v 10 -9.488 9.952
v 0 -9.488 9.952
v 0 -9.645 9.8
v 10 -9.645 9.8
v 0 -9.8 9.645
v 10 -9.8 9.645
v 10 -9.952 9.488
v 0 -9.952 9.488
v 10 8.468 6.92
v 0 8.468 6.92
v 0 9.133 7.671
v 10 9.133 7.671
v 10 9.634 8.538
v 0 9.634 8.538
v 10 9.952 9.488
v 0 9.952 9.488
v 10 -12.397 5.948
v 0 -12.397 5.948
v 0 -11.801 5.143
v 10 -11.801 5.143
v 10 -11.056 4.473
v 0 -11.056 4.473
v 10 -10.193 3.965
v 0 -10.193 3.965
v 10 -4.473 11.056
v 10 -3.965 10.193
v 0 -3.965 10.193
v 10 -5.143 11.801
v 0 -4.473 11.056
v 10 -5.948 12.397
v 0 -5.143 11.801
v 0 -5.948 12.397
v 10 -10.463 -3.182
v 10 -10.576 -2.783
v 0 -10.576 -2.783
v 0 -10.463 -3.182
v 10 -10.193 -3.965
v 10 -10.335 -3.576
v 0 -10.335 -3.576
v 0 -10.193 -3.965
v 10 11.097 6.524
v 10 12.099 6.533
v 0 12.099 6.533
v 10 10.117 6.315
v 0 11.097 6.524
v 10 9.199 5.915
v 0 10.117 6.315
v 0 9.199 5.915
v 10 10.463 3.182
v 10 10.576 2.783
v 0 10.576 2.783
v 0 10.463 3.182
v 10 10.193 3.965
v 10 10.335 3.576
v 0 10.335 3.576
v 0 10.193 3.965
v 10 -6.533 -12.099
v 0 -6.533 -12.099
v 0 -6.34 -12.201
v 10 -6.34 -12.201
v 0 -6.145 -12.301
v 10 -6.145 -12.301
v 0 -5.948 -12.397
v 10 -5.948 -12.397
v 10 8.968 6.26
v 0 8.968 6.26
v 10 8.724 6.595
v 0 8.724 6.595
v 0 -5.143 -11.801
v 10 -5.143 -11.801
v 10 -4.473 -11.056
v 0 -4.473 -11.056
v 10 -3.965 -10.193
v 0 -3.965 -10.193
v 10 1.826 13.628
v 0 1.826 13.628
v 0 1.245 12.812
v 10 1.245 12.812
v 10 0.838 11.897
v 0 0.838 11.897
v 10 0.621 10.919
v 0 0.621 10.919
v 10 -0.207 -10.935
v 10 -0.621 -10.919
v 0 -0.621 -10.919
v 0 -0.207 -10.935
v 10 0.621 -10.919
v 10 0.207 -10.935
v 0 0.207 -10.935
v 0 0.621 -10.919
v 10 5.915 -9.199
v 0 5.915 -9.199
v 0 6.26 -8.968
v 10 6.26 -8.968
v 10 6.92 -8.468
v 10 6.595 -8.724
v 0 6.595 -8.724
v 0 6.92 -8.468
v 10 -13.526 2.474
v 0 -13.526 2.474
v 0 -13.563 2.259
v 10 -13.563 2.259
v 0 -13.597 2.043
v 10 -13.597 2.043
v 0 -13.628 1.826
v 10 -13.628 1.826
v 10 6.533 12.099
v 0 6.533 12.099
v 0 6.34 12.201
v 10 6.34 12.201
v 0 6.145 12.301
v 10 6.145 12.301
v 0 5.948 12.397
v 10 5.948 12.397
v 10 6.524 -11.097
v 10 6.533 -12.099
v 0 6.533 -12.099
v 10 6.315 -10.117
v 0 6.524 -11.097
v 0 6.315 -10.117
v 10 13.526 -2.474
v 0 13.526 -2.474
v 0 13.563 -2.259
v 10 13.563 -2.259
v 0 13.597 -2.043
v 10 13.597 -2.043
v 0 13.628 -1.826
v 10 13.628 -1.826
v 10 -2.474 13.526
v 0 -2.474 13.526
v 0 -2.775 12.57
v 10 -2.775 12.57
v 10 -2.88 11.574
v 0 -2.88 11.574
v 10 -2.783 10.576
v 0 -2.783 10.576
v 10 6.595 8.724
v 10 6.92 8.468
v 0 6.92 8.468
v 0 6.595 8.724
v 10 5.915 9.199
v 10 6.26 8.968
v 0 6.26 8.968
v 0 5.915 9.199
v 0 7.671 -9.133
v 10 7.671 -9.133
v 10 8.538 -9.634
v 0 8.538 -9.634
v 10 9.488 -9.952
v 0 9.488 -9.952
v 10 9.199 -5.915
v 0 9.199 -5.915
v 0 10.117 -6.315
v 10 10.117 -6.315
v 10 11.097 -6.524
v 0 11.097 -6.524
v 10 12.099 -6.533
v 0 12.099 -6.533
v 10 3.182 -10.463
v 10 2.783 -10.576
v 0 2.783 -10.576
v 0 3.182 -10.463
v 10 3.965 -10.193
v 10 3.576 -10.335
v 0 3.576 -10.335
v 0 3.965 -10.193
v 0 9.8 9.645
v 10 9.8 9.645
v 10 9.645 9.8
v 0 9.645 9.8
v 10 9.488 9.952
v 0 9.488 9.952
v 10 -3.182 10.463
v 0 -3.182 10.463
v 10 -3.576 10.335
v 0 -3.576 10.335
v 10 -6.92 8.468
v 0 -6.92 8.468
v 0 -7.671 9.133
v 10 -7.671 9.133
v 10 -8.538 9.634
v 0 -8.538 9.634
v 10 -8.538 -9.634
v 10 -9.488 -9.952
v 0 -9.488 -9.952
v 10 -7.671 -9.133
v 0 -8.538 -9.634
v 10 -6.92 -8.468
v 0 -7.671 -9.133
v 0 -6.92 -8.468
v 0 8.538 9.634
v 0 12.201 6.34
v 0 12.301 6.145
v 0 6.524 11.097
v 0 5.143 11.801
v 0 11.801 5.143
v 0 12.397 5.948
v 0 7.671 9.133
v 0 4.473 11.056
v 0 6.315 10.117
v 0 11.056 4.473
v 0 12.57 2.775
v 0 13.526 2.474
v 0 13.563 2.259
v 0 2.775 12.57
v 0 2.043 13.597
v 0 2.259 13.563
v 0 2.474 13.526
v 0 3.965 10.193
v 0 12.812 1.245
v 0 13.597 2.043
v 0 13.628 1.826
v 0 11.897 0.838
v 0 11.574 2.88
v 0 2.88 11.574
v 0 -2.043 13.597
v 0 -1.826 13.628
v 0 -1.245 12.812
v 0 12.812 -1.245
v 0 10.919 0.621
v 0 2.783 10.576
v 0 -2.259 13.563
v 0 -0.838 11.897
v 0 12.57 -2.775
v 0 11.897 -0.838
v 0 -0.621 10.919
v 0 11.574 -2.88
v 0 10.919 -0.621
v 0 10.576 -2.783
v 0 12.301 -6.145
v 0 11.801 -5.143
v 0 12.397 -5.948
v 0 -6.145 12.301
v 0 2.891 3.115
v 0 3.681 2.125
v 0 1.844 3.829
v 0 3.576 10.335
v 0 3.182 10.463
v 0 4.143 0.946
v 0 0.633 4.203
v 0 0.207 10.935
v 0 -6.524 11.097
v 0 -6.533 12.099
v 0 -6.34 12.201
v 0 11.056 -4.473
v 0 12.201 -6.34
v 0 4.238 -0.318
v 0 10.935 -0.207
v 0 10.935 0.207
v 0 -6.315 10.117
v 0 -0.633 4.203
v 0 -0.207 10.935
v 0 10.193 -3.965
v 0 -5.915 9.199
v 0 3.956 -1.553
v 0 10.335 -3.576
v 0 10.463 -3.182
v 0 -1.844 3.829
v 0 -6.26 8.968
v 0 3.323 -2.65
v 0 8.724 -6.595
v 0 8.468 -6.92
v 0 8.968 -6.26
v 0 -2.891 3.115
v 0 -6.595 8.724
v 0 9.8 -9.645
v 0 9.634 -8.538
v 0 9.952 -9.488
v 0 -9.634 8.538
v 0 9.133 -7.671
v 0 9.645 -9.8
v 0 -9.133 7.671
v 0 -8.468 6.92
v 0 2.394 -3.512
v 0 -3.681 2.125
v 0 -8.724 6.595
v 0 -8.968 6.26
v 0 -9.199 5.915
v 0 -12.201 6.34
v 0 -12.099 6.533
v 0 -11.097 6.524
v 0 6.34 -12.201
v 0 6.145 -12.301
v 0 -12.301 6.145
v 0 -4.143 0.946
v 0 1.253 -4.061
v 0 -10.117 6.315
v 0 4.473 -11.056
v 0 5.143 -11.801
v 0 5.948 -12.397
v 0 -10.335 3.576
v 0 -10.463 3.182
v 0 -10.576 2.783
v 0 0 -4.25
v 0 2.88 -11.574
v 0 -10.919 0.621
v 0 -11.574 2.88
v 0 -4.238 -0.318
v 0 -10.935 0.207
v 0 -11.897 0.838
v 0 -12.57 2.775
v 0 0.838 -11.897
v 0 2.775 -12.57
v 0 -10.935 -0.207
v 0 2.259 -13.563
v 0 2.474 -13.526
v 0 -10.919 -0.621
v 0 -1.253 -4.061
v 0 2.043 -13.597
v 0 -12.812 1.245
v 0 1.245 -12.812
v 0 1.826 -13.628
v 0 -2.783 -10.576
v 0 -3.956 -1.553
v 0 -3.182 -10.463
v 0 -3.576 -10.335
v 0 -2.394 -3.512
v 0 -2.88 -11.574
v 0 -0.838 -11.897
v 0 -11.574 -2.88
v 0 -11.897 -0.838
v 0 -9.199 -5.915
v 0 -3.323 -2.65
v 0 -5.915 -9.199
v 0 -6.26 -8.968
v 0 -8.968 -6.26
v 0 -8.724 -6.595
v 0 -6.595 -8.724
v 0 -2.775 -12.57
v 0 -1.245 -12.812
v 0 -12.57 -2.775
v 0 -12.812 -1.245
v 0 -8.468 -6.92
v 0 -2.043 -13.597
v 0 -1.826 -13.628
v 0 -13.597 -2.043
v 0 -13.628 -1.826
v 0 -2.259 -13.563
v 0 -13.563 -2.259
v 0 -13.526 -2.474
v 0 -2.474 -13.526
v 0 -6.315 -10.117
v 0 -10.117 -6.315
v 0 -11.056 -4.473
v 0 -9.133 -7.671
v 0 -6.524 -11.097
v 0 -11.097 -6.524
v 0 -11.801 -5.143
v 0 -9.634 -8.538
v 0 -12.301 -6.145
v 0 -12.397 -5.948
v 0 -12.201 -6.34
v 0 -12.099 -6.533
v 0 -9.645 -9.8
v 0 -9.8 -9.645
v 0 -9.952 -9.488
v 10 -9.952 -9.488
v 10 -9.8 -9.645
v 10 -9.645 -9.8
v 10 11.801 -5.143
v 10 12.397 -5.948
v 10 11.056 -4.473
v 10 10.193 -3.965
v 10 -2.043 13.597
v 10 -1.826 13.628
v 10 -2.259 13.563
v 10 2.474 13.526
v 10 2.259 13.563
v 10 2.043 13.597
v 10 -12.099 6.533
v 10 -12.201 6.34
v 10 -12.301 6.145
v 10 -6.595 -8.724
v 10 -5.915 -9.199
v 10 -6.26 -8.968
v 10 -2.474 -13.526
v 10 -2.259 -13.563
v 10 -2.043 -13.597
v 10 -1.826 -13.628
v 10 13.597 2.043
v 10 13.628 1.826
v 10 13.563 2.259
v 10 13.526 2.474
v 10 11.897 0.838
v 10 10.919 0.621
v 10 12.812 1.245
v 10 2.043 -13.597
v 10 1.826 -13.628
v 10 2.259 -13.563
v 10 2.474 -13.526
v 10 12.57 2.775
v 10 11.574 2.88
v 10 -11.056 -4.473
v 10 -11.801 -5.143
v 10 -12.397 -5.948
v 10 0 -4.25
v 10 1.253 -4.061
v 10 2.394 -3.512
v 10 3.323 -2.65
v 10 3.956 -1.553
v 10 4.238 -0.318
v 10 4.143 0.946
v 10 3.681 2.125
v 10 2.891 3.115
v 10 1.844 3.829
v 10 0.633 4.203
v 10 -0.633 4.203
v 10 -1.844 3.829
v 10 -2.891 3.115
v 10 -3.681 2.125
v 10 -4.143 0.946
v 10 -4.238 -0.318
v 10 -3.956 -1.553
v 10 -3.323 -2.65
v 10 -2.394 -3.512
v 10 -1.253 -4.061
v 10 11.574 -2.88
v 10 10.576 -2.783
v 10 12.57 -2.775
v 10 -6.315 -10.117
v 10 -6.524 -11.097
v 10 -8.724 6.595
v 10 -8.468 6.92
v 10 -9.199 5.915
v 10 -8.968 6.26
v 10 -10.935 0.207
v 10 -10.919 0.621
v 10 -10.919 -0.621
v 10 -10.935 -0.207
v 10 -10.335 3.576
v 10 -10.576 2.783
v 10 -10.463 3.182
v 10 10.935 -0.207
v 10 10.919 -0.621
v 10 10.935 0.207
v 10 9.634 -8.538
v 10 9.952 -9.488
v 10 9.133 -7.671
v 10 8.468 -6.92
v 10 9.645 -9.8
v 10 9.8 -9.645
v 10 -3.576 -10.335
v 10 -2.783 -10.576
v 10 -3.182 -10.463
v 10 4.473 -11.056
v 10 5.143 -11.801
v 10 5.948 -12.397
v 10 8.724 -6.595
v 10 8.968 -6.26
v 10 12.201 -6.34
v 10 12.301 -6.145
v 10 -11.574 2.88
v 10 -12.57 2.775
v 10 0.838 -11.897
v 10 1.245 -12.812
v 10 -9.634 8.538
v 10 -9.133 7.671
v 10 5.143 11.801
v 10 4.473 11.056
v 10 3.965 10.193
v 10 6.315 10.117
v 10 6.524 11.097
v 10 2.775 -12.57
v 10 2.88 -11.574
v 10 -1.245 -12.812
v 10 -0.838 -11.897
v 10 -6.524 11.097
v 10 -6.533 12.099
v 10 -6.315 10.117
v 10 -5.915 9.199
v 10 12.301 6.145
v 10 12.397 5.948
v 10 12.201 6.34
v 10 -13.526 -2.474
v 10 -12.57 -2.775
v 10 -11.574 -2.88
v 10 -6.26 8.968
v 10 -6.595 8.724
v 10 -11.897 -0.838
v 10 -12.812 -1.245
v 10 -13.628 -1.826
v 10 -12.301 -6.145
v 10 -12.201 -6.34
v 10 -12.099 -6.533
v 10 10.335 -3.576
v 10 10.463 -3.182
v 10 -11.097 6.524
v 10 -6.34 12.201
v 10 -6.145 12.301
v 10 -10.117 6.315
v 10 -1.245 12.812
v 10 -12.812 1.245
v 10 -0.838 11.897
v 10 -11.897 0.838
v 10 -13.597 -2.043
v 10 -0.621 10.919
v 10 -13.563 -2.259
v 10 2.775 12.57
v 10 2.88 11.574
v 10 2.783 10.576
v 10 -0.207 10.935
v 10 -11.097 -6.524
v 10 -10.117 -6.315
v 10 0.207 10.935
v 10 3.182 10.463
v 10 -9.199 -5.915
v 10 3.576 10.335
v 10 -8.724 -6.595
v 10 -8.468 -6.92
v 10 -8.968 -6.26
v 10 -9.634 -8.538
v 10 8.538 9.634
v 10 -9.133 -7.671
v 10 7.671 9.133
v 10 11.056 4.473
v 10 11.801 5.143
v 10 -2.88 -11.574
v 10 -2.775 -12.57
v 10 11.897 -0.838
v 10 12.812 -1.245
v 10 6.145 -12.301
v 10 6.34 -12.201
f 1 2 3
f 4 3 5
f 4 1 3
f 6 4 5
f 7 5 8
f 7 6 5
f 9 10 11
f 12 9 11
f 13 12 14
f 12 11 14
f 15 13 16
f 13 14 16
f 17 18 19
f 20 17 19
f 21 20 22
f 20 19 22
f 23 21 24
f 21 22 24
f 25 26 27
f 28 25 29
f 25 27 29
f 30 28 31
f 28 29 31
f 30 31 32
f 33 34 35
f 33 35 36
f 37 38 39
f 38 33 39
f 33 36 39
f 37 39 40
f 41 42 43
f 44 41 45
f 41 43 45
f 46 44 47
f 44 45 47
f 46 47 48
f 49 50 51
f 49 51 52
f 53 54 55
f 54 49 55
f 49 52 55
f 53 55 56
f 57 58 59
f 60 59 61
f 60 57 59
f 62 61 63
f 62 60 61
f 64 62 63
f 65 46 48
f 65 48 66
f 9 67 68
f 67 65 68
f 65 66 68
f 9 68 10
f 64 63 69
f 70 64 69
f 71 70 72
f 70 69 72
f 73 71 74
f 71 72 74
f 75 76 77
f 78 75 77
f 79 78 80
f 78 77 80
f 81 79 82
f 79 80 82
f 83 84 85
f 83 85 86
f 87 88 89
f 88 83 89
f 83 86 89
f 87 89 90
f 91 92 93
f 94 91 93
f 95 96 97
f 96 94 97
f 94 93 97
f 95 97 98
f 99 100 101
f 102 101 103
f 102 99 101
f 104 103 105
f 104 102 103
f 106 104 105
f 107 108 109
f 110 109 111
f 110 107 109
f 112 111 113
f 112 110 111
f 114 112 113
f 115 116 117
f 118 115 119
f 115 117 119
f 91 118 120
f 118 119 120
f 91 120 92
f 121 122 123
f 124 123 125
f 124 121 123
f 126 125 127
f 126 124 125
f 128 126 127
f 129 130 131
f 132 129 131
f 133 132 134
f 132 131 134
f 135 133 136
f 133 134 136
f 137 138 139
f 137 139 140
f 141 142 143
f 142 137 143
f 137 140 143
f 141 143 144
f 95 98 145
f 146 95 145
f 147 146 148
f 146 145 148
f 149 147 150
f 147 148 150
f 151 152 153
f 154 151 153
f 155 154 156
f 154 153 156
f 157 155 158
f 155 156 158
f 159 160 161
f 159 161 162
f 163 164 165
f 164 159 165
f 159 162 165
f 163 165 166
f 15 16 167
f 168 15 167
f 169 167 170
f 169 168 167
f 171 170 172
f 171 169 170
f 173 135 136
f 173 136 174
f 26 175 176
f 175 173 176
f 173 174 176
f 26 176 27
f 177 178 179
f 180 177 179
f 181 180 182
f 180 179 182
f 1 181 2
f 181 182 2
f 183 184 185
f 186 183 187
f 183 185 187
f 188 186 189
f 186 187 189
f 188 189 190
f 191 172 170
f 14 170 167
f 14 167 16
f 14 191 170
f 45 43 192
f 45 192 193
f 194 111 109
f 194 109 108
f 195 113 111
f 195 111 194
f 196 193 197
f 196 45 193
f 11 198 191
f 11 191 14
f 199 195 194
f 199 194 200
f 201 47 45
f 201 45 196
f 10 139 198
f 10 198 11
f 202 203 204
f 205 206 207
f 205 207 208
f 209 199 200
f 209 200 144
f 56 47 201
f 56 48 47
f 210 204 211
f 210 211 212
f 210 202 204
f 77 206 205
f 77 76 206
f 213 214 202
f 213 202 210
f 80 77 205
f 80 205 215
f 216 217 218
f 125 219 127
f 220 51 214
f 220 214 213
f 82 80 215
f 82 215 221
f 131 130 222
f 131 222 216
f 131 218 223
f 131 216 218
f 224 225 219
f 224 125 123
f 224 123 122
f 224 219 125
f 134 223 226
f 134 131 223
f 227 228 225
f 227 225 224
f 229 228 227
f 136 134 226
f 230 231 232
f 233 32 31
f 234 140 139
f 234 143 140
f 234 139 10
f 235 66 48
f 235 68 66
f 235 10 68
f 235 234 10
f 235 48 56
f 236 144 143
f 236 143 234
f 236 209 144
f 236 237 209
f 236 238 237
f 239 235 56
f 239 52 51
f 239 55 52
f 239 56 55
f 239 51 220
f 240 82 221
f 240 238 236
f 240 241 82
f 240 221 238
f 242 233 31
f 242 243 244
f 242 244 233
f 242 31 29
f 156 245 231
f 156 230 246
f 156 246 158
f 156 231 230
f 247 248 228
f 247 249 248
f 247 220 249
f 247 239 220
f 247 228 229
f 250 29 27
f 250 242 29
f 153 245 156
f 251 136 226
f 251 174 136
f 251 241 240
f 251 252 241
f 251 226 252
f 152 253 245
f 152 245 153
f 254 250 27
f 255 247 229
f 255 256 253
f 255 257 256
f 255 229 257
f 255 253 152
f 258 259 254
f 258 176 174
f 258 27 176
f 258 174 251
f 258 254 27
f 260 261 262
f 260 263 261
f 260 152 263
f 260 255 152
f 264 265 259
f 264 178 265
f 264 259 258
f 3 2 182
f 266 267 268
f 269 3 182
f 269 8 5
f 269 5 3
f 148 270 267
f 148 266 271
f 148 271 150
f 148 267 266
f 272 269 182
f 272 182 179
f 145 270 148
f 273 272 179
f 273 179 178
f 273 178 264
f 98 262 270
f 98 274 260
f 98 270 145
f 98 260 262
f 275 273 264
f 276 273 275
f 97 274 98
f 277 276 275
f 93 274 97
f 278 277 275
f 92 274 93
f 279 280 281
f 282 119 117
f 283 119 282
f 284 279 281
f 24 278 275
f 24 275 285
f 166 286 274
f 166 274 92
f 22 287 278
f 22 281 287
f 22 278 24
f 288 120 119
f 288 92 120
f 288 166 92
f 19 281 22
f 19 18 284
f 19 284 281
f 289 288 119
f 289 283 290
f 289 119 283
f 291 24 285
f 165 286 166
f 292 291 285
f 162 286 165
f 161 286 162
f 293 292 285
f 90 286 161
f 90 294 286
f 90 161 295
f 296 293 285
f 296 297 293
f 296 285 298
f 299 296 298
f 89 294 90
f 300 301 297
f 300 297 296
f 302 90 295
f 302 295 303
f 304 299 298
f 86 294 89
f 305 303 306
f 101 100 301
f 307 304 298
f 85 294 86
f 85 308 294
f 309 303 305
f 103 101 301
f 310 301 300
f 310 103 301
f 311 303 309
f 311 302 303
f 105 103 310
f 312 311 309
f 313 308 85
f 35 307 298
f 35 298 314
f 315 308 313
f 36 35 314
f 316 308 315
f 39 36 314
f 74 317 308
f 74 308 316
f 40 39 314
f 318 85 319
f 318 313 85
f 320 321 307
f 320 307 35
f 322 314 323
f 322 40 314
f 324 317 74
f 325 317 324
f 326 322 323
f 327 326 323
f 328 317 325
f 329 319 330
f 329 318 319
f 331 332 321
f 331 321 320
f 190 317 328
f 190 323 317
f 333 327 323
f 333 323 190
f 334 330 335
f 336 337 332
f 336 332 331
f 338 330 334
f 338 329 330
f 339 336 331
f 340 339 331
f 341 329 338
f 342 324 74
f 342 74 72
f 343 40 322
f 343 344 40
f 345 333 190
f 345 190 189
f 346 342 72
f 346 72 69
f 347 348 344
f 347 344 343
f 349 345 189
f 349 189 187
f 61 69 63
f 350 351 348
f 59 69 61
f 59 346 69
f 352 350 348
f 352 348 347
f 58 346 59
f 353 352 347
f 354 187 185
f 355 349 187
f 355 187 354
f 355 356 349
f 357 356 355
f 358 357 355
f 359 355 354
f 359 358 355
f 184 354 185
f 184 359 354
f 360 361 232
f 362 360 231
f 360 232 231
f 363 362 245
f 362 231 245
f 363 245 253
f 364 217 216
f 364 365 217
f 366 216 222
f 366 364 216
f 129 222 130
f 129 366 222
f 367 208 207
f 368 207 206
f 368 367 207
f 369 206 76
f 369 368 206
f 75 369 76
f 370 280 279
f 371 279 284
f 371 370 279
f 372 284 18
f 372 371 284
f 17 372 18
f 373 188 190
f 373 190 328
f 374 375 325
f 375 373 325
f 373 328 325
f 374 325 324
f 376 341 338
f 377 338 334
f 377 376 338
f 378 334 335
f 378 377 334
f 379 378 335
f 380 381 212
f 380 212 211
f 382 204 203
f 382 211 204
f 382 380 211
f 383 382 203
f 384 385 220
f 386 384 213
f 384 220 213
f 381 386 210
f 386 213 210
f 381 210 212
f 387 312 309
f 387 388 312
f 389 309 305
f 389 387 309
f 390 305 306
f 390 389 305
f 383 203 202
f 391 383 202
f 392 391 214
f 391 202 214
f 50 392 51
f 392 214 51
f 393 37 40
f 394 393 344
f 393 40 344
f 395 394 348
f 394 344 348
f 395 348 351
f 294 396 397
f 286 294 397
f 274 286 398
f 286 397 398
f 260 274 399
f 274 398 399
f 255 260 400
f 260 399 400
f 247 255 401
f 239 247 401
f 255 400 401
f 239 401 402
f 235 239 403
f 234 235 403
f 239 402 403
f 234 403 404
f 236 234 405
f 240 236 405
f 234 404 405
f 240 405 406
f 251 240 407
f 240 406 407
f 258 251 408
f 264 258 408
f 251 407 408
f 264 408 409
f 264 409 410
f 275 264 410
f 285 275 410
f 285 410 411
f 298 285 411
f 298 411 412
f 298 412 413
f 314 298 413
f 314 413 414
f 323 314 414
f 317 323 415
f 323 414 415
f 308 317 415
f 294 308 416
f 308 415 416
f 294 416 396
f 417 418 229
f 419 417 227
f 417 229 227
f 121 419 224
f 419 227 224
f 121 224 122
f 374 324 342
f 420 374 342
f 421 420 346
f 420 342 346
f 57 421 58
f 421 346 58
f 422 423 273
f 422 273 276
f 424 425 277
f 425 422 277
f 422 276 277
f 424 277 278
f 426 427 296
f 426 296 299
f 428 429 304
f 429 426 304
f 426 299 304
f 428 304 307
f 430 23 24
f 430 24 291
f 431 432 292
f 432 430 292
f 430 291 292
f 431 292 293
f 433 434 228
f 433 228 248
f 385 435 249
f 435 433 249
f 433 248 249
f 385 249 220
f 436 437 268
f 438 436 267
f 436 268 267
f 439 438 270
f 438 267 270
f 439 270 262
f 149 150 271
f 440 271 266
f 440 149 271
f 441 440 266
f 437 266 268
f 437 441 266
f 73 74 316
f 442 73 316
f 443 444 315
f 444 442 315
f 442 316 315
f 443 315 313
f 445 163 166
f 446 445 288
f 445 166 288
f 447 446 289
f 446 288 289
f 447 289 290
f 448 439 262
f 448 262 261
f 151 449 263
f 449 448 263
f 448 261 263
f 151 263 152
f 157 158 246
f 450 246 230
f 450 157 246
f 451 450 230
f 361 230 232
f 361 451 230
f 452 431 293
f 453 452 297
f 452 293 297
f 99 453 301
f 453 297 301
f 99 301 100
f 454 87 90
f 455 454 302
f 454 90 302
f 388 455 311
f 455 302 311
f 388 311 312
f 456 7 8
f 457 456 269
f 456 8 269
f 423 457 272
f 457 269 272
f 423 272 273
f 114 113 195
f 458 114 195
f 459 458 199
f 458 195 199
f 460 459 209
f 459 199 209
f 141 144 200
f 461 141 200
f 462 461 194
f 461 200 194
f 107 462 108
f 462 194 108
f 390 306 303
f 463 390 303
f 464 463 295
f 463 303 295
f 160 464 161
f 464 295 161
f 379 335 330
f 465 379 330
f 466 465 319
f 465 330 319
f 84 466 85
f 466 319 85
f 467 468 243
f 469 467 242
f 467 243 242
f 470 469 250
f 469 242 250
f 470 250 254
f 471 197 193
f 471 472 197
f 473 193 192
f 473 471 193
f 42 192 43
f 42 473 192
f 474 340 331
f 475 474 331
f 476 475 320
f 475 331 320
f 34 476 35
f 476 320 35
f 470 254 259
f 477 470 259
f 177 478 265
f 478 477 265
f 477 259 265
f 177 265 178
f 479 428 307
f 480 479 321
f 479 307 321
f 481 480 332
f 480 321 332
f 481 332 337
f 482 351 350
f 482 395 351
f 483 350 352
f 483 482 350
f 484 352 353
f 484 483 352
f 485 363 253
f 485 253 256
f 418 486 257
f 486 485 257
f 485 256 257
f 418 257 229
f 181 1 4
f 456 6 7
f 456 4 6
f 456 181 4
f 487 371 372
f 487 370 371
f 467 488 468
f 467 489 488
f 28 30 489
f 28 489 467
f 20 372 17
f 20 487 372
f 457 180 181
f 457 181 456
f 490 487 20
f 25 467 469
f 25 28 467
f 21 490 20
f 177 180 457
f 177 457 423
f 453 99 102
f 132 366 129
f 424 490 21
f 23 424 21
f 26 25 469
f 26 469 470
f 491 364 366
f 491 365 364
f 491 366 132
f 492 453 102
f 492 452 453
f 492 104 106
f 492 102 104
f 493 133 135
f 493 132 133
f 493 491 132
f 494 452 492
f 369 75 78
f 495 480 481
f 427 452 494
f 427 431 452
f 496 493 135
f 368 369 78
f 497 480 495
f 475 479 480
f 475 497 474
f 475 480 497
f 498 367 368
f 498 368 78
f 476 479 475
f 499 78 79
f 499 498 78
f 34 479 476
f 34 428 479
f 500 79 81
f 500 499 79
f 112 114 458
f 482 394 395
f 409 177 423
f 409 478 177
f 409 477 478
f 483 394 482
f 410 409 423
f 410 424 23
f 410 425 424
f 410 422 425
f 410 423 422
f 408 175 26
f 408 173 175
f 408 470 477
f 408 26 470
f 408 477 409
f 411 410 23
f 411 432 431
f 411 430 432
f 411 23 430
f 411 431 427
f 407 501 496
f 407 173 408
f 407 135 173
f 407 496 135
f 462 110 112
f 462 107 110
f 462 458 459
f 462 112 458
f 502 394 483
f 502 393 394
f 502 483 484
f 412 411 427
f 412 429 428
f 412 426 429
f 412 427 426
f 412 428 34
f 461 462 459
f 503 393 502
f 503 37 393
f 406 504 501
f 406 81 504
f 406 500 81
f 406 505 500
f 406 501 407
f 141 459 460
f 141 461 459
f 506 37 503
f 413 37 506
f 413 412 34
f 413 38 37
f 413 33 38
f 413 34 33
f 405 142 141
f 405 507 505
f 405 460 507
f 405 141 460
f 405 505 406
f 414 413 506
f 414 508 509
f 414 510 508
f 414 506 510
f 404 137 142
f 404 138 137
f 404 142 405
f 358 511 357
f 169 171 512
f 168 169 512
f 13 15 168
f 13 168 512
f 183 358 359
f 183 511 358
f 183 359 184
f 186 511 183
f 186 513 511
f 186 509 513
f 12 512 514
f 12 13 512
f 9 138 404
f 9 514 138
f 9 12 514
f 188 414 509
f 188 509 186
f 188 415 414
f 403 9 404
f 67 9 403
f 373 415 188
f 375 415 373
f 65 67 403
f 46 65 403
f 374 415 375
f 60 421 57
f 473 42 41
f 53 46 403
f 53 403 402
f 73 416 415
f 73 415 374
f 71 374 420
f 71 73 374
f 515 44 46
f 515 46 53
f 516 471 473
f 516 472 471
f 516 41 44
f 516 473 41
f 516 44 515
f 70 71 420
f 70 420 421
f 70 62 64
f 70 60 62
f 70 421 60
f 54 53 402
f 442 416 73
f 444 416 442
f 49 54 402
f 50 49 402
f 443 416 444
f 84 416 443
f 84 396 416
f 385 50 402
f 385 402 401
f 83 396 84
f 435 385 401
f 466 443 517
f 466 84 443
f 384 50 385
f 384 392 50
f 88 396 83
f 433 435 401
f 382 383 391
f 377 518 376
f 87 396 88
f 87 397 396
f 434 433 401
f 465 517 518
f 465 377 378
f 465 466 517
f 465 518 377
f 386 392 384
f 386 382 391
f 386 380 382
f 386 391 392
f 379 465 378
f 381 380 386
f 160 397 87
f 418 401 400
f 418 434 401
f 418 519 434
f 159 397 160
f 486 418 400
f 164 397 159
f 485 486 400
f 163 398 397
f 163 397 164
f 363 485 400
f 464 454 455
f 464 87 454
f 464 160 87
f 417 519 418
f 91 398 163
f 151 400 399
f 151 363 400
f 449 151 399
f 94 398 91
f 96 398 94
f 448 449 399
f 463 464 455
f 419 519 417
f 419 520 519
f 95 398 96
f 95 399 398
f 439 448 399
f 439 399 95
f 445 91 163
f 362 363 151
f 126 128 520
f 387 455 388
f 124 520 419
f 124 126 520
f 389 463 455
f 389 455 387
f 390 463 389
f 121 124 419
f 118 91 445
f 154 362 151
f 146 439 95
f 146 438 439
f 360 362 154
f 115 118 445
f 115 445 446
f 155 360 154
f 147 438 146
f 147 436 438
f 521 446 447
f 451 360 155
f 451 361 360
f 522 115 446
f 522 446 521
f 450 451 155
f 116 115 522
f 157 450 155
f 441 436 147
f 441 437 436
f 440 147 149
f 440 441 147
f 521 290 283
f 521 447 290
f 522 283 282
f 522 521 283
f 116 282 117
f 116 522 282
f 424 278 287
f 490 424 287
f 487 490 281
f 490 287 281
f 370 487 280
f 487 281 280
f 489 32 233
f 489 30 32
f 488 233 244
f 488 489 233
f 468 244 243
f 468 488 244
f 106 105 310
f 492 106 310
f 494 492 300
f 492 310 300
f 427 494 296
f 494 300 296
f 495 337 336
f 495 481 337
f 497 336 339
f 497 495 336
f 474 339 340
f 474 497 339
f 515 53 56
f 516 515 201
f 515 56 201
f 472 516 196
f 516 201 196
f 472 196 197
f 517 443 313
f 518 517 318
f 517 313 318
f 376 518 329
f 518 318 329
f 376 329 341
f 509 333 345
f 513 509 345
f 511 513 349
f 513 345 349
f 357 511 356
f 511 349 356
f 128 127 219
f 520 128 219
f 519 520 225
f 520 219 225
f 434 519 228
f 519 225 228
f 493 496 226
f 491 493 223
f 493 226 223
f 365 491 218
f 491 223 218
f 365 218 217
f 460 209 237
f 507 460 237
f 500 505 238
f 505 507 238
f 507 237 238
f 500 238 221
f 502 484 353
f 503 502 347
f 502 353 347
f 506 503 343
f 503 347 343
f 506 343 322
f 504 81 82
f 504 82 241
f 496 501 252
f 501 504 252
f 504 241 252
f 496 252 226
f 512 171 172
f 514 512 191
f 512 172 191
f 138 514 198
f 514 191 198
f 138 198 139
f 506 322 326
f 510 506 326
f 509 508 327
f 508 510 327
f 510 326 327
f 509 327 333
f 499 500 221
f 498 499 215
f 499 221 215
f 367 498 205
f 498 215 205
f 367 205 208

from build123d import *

# Parameters (mm, degrees)
BASPROSKE_W         = 10
BASPROSKE_H         = 13.75
TOOTHCUT_DEPTH      = 22.866069606
TEETHCUTS_COUNT     = 20
TEETHCUTS_ANGLE     = 342
BORSKE_R            = 2
BORE_DEPTH          = 50.0000508
SKETCH2_R           = 2
BOSS_EXTRUDE1_DEPTH = 10
SKETCH3_R           = 4.25
CUT_EXTRUDE2_DEPTH  = 10


with BuildPart() as part:
    # BasProSke → Base-Revolve (revolve)
    with BuildSketch(Plane(origin=(0, 0, 0), x_dir=(1, 0, 0), z_dir=(0, 1, 0)), mode=Mode.PRIVATE) as base_revolve_sk:
        with Locations((5, 6.875)):
            Rectangle(BASPROSKE_W, BASPROSKE_H)
    revolve(base_revolve_sk.sketch.rotate(Axis((-10, 0, 0), (1, 0, 0)), 180), axis=Axis((-10, 0, 0), (1, 0, 0)))

    # TooCutSke → ToothCut (cut, through all)
    with BuildSketch(Plane(origin=(0, 0, 0), x_dir=(0, 0, -1), z_dir=(1, 0, 0))):
        with BuildLine():
            ThreePointArc((0.62110296, 10.918848994), (0, 10.9365), (-0.62110296, 10.918848994))
            ThreePointArc((-0.62110296, 10.918848994), (-1.024517052, 12.378857135), (-1.846615859, 13.651067908))
            ThreePointArc((-1.846615859, 13.651067908), (0, 13.7754), (1.846615859, 13.651067908))
            ThreePointArc((1.846615859, 13.651067908), (1.024517052, 12.378857135), (0.62110296, 10.918848994))
        make_face()
    toothcut = extrude(amount=TOOTHCUT_DEPTH, mode=Mode.SUBTRACT)

    # TeethCuts: ToothCut ×20 about axis
    teethcuts_axis = Axis((-10, 0, 0), (1, 0, 0))
    for i in range(1, TEETHCUTS_COUNT):
        add(toothcut.rotate(teethcuts_axis, i * TEETHCUTS_ANGLE / (TEETHCUTS_COUNT - 1)), mode=Mode.SUBTRACT)

    # BorSke → Bore (cut, symmetric)
    with BuildSketch(Plane(origin=(0, 0, 0), x_dir=(0, 0, -1), z_dir=(1, 0, 0))):
        with Locations(Location((0, 0, 0), (0, 0, 180))):
            Circle(BORSKE_R)
    extrude(amount=BORE_DEPTH, both=True, mode=Mode.SUBTRACT)

    # Sketch2 → Boss-Extrude1 (add)
    with BuildSketch(Plane(origin=(10, 0, 0), x_dir=(0, 0, -1), z_dir=(1, 0, 0))):
        Circle(SKETCH2_R)
    extrude(amount=-BOSS_EXTRUDE1_DEPTH)

    # Sketch3 → Cut-Extrude2 (cut)
    with BuildSketch(Plane(origin=(10, 0, 0), x_dir=(0, 0, -1), z_dir=(1, 0, 0))):
        Circle(SKETCH3_R)
    extrude(amount=-CUT_EXTRUDE2_DEPTH, mode=Mode.SUBTRACT)


solid = part.part
